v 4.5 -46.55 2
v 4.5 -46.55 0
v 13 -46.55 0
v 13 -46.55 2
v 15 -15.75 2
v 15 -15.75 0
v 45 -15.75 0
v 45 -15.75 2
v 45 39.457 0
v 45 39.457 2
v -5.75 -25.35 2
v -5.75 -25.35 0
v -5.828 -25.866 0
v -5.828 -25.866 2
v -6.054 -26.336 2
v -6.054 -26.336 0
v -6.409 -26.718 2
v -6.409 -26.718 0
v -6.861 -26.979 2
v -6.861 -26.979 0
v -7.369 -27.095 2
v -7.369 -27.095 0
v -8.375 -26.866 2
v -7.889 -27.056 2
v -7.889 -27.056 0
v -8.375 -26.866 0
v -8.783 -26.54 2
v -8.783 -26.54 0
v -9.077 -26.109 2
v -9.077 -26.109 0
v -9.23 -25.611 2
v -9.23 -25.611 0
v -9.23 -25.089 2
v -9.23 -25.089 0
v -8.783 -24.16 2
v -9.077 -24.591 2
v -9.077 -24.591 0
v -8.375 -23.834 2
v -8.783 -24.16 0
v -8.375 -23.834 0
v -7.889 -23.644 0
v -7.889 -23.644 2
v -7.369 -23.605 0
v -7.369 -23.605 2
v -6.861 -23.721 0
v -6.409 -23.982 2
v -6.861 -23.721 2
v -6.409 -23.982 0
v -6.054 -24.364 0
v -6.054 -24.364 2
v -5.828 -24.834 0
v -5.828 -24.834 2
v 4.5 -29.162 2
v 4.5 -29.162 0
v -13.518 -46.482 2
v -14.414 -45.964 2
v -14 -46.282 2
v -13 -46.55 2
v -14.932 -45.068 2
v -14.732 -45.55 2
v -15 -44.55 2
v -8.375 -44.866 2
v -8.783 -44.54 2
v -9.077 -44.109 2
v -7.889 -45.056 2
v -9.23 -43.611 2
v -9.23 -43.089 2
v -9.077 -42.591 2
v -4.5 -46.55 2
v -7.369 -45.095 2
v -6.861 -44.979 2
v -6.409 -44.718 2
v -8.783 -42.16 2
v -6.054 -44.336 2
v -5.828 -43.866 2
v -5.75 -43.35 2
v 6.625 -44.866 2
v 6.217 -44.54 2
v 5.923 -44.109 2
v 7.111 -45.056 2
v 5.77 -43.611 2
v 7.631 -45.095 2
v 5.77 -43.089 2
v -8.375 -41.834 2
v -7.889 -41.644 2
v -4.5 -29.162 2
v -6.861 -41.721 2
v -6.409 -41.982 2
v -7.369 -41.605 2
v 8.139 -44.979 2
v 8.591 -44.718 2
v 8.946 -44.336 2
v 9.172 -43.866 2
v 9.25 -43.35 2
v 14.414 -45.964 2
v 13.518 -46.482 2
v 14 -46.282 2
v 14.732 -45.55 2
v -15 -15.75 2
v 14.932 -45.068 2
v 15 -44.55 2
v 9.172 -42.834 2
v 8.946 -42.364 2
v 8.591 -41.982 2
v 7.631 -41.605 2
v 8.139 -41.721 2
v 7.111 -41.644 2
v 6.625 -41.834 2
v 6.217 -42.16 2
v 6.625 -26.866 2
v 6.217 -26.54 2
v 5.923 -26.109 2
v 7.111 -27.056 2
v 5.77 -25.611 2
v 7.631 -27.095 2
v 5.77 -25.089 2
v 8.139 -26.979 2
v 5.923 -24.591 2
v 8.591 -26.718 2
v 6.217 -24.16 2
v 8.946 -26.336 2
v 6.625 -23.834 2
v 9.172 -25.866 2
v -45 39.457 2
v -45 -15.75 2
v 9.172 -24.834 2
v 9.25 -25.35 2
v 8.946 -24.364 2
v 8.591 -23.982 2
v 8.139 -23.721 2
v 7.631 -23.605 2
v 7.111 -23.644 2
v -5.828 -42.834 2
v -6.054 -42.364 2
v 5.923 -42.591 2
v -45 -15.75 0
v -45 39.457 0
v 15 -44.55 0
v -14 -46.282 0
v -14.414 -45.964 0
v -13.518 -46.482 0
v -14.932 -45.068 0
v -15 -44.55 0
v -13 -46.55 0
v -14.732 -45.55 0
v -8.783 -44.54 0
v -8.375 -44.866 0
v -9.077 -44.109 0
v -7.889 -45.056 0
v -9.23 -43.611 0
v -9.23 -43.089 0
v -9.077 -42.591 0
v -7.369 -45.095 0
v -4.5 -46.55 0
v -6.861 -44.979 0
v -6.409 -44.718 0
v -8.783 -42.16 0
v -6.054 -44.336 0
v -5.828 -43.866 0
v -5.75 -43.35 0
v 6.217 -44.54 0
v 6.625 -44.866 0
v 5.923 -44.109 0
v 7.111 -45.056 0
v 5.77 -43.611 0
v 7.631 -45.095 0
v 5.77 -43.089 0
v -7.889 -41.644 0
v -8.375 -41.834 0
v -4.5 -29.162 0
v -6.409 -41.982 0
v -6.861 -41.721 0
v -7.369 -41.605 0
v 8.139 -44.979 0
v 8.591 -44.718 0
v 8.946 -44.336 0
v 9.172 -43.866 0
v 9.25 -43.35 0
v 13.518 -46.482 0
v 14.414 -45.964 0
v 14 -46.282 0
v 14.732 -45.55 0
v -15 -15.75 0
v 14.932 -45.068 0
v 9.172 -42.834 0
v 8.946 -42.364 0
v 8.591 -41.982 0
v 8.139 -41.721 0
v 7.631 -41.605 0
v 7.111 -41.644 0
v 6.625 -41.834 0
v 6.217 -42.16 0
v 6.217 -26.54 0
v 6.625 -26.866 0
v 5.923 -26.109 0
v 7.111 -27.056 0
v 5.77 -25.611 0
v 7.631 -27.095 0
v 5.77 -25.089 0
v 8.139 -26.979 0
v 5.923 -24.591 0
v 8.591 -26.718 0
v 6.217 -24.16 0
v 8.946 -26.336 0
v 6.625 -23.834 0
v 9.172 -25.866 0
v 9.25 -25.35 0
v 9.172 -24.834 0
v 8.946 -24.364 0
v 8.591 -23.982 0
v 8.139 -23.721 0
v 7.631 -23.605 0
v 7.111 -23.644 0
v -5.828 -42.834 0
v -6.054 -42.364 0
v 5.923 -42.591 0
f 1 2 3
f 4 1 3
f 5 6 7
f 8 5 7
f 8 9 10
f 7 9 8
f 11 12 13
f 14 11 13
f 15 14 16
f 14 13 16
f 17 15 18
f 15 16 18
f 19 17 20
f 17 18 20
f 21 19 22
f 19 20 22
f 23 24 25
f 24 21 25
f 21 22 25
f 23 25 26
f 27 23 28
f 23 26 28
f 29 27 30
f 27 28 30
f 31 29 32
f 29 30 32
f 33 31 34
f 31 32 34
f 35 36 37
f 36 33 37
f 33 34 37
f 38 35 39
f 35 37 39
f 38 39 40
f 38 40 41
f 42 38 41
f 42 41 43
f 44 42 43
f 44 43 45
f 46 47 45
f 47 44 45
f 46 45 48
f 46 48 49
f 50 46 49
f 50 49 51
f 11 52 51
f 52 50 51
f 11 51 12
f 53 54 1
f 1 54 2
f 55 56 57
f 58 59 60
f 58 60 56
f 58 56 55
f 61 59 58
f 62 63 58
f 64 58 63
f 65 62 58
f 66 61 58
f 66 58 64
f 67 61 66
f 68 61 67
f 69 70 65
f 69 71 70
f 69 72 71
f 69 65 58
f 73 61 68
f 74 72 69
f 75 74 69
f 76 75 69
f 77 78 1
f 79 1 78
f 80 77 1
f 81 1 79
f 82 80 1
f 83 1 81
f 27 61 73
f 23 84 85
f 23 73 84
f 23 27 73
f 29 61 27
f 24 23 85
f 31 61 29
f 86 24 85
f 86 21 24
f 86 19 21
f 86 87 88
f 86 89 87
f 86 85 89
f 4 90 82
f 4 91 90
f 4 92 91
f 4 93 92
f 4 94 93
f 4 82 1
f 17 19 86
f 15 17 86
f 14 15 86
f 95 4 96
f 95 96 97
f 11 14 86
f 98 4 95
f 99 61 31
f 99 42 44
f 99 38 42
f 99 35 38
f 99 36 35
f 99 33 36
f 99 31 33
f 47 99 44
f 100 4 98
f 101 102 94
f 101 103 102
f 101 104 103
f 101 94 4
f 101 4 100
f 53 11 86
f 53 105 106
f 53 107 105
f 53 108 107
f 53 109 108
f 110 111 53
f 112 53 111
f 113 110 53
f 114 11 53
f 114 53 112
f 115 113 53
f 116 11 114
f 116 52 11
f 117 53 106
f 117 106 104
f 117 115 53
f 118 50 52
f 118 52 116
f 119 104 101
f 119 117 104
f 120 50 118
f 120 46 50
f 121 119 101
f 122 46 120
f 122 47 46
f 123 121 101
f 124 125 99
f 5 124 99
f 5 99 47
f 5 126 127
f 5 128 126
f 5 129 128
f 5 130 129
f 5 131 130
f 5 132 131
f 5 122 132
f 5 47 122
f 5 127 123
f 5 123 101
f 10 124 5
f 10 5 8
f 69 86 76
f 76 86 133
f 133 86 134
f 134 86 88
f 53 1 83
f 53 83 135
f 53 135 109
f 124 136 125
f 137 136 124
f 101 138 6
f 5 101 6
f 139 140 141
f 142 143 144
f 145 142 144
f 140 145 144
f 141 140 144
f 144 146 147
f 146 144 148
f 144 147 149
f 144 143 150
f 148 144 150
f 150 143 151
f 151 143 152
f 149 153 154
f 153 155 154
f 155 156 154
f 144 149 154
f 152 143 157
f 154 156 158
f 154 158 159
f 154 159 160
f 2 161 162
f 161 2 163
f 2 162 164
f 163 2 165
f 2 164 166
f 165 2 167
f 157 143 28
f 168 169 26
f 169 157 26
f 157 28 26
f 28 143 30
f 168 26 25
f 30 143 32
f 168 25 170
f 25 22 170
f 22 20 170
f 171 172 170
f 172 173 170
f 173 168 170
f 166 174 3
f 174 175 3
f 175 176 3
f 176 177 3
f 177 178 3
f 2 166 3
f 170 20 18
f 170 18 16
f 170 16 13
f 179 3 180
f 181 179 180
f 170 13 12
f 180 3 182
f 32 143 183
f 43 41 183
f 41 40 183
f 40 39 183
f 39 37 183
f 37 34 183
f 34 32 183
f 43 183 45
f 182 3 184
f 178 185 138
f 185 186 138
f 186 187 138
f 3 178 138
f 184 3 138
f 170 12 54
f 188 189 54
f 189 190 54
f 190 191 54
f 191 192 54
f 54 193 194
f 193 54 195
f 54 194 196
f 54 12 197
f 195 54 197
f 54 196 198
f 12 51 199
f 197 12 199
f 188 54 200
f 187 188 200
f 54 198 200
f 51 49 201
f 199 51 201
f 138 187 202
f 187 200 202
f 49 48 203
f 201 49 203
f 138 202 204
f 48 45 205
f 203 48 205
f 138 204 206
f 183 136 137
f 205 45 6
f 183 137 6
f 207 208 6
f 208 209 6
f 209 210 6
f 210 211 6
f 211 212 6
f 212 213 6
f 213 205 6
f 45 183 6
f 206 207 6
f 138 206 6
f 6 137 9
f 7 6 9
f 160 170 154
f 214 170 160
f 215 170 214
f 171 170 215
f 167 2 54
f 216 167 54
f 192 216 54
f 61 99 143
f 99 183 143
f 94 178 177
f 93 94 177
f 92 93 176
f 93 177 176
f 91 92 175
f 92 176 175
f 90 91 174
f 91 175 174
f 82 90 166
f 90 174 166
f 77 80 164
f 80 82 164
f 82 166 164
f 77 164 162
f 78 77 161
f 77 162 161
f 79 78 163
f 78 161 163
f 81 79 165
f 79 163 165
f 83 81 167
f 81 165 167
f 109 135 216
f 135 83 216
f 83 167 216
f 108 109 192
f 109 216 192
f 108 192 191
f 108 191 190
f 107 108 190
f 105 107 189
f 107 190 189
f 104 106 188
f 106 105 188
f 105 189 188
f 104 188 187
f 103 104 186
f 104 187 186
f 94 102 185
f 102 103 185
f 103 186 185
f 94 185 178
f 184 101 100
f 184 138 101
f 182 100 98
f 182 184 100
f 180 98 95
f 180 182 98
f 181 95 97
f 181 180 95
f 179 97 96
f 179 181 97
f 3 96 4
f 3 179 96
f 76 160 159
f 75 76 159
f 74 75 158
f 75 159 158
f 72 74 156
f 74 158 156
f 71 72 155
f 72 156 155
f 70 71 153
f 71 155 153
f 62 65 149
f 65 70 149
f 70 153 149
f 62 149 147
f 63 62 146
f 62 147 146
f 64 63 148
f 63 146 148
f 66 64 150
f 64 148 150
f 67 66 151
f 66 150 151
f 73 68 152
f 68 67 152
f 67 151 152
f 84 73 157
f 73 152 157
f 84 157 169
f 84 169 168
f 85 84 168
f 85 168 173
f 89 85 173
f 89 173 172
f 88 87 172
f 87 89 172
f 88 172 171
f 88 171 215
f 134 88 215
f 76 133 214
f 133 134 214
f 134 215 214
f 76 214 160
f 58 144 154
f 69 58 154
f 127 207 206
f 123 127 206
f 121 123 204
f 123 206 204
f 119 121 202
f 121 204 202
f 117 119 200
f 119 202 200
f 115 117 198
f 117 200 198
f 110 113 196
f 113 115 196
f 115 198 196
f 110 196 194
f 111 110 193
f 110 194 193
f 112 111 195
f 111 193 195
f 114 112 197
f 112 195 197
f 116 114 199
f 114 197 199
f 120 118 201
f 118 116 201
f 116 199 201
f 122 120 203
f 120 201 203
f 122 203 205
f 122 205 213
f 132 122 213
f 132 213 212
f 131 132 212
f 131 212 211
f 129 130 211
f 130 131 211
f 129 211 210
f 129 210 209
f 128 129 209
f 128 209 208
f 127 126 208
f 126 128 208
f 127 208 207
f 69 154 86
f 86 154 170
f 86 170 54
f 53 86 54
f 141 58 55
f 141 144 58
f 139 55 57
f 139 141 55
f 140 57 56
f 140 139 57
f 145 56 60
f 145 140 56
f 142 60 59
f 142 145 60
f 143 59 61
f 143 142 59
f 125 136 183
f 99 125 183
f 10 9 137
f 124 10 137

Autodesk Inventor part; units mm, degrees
ref_plane "YZ Plane" through (0, 0, 0) normal (1, 0, 0) x (0, 1, 0)
ref_plane "XZ Plane" through (0, 0, 0) normal (0, 1, 0) x (-1, 0, 0)
ref_plane "XY Plane" through (0, 0, 0) normal (0, 0, 1) x (1, 0, 0)
sketch "Sketch1" plane through (0, 0, 0) normal (0, 0, 1) x (1, 0, 0)
  line L0 (4.5, -29.1615) -> (4.5, -46.55) projected
  line L1 (4.5, -46.55) -> (13, -46.55) projected
  arc A0 (13, -46.55) -> (15, -44.55) centre (13, -44.55) ccw projected
  line L2 (15, -44.55) -> (15, -15.75) projected
  line L3 (15, -15.75) -> (45, -15.75) projected
  line L4 (45, 39.4571) -> (45, -15.75) projected
  line L5 (-45, -15.75) -> (-45, 39.4571) projected
  line L6 (-45, -15.75) -> (-15, -15.75) projected
  line L7 (-15, -15.75) -> (-15, -44.55) projected
  arc A1 (-15, -44.55) -> (-13, -46.55) centre (-13, -44.55) ccw projected
  line L8 (-13, -46.55) -> (-4.5, -46.55) projected
  line L9 (-4.5, -46.55) -> (-4.5, -29.1615) projected
  line L10 (-4.5, -29.1615) -> (4.5, -29.1615) projected
  circle A2 centre (7.5, -43.35) radius 1.75 projected
  circle A3 centre (7.5, -25.35) radius 1.75 projected
  circle A4 centre (-7.5, -25.35) radius 1.75 projected
  circle A5 centre (-7.5, -43.35) radius 1.75 projected
  line L11 (45, 39.4571) -> (-45, 39.4571) projected
  line L12 (-23.9404, 34.5074) -> (-20.8237, 34.5074) projected
  ellipse E0 centre (-19.8512, 32.8923) end of major axis (-19.8512, 35.0136) minor radius 1.5 (-18.8787, 34.5074) -> (-20.8237, 34.5074) ccw projected
  line L13 (-18.8787, 34.5074) -> (-15.7619, 34.5074) projected
  line L14 (-15.7619, 34.5074) -> (-15.7619, 27.8723) projected
  line L15 (-15.7619, 27.8723) -> (-23.9404, 27.8723) projected
  line L16 (-23.9404, 27.8723) -> (-23.9404, 34.5074) projected
  line L17 (15.7619, 34.5074) -> (18.8787, 34.5074) projected
  ellipse E1 centre (19.8512, 32.8923) end of major axis (19.8512, 35.0136) minor radius 1.5 (20.8237, 34.5074) -> (18.8787, 34.5074) ccw projected
  line L18 (20.8237, 34.5074) -> (23.9404, 34.5074) projected
  line L19 (23.9404, 34.5074) -> (23.9404, 27.8723) projected
  line L20 (23.9404, 27.8723) -> (15.7619, 27.8723) projected
  line L21 (15.7619, 27.8723) -> (15.7619, 34.5074) projected
  point P0 (0, 0)
extrude "Extrusion1" add sketch "Sketch1" along normal blind 2 contours L10 L9 L8 A1 L7 L6 L5 L11 L4 L3 L2 A0 L1 L0 | L12 E0 L13 L14 L15 L16 | L17 E1 L18 L19 L20 L21
properties part number "lead" material "Lead"
